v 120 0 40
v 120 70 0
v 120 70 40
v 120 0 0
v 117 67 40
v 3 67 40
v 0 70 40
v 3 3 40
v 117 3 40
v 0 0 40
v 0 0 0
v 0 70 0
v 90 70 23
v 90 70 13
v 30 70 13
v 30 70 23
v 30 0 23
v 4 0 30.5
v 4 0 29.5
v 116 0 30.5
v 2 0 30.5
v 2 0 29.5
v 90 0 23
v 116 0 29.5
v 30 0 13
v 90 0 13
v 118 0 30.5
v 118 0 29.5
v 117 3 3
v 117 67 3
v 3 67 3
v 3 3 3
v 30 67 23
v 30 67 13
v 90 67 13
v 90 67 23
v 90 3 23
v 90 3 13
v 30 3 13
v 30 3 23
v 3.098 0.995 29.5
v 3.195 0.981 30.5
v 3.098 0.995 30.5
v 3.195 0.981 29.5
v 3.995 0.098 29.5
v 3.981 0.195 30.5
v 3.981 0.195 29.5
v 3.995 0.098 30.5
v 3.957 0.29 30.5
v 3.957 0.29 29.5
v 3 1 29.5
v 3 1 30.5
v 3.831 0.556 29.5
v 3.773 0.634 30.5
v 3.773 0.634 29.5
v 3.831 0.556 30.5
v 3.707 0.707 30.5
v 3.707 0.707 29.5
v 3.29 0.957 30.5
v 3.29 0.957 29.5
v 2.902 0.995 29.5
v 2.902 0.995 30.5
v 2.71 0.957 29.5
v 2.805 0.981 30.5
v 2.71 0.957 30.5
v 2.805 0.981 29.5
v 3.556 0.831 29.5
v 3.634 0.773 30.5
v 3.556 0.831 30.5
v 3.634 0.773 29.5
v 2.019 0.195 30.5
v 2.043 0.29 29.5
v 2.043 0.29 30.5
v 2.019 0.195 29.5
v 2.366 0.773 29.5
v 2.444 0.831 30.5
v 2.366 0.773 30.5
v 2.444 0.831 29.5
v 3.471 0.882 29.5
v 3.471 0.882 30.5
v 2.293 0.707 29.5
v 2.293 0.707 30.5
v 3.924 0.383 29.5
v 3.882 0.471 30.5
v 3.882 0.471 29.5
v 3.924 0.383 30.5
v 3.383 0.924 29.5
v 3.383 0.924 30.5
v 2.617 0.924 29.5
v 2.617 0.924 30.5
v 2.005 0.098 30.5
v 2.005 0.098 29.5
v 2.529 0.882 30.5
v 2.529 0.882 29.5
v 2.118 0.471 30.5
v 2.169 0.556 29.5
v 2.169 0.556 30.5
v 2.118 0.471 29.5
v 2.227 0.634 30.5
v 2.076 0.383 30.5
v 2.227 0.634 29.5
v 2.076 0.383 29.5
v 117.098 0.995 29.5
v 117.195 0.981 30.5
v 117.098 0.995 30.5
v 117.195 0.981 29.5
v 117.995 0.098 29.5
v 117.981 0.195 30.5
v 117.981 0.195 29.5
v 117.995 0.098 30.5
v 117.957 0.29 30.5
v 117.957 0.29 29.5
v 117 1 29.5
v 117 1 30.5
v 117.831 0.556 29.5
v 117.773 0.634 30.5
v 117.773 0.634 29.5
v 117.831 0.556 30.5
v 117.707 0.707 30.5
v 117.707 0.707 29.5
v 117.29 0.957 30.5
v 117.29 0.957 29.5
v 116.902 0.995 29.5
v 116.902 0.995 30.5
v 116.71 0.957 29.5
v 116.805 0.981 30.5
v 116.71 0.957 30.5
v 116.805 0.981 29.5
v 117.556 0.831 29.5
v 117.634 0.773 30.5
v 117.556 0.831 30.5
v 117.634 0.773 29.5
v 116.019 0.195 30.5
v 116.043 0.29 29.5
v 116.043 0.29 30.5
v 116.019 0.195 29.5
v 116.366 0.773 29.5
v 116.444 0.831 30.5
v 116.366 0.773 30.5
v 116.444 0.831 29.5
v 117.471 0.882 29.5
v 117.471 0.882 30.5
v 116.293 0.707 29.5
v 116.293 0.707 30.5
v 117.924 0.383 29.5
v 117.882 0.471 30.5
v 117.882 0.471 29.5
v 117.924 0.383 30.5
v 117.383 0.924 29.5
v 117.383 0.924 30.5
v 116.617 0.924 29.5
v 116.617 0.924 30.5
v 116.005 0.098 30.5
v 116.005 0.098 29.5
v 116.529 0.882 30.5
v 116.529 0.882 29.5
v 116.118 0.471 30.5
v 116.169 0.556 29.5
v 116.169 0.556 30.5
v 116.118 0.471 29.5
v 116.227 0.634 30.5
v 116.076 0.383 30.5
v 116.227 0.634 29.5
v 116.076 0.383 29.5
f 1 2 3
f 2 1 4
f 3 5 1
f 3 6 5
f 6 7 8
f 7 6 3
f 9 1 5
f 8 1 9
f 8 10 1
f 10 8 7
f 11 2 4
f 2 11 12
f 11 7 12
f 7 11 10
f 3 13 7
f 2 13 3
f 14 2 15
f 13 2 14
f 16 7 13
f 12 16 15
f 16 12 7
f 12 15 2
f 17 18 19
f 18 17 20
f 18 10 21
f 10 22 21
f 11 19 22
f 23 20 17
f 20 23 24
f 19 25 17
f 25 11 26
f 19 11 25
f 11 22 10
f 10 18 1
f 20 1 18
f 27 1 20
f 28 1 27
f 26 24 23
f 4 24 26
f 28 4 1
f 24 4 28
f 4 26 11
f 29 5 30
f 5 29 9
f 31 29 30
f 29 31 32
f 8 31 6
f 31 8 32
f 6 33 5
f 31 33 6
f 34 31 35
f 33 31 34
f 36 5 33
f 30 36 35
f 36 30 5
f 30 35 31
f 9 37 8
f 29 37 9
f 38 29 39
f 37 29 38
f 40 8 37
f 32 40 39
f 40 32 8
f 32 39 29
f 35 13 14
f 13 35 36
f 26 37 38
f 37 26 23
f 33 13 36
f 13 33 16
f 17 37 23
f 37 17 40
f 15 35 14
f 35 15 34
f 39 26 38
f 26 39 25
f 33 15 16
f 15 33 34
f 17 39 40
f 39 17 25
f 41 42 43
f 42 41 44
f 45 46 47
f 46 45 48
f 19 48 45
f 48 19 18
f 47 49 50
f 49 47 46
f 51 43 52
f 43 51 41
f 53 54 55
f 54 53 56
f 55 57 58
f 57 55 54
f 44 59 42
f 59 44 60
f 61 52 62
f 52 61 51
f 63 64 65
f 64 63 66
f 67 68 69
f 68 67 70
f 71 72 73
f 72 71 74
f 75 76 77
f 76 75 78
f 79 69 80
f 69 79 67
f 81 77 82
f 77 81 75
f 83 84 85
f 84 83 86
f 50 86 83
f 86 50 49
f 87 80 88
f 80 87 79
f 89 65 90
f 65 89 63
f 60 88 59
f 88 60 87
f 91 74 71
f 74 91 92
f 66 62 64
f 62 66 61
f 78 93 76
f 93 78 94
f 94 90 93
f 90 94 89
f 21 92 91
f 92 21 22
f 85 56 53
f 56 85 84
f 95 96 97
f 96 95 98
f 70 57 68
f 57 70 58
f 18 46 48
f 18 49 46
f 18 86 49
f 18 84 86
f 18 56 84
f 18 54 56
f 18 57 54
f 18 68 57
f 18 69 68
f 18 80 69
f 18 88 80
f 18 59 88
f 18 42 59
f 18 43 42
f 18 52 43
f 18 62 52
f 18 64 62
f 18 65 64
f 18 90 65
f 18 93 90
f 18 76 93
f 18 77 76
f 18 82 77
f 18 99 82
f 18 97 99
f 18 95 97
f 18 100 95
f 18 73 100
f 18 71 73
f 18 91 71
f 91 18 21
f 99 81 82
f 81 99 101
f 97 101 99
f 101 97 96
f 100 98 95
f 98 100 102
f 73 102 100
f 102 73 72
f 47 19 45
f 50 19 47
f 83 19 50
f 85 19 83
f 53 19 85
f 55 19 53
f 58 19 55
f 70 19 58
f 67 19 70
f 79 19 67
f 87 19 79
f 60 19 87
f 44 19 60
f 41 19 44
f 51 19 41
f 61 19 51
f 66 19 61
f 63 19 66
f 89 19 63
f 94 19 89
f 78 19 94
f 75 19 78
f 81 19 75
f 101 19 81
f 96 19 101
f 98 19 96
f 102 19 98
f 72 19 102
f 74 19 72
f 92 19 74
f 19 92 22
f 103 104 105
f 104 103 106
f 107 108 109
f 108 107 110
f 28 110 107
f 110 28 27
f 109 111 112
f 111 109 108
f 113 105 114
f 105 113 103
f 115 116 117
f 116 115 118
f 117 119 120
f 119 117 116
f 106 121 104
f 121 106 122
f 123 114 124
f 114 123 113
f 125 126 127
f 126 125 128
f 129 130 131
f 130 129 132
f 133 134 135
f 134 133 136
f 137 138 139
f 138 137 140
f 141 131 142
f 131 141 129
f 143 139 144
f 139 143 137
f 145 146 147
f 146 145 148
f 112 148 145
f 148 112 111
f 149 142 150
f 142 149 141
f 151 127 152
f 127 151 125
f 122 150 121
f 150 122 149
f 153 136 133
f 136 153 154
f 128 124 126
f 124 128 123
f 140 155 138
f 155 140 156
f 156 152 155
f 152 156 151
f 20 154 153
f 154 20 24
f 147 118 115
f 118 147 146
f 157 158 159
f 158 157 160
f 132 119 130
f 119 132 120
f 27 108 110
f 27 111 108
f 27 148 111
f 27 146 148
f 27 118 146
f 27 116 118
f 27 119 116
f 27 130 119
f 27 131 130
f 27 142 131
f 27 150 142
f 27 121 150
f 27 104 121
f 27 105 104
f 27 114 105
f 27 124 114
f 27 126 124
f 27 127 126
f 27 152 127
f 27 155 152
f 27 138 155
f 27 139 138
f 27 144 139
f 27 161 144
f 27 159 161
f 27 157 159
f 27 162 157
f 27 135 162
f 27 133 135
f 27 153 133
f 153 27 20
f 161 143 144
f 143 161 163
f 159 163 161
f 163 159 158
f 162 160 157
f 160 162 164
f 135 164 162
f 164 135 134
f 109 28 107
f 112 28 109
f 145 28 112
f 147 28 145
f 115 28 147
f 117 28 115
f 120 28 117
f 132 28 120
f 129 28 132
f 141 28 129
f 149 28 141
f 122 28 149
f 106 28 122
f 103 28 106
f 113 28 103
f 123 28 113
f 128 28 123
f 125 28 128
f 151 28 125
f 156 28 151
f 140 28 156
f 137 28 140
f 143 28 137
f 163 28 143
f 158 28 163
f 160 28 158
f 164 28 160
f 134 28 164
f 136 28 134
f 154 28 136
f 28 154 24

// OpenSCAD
// Buffer tank for mini horizontal gel-electrophoresis box
// Outer dimensions: 120 mm (X) x 70 mm (Y) x 40 mm (Z)
// Wall thickness: 3 mm
// Floor thickness: 3 mm
// Platform: 60 mm (X) x 70 mm (Y) x 10 mm (Z), centered in X, z = 13

// Dimensions
tank_length = 120;   // X dimension
tank_width = 70;    // Y dimension
tank_height = 40;     // Z dimension
wall_thickness = 3; // Wall and floor thickness
platform_length = 60; // X dimension of platform
platform_width = 70;  // Y dimension of platform (full width)
platform_height = 10; // Z dimension of platform
platform_z = 13;    // Platform top height above floor
hole_diameter = 2;    // Electrode hole diameter
hole_z = 30;          // Electrode hole height

// Main tank body (outer dimensions)
outer = [tank_length, tank_width, tank_height];

// Inner dimensions (subtracting wall thickness)
inner_length = tank_length - 2 * wall_thickness;
inner_width = tank_width - 2 * wall_thickness;
inner_height = tank_height - wall_thickness;

// Platform dimensions (inner)
platform_inner_length = platform_length;
platform_inner_width = platform_width;

// Create the tank
difference() {
  // Outer shell
  cube(outer, center = false);
  
  // Inner hollow
  translate([wall_thickness, wall_thickness, wall_thickness]) {
    cube([inner_length, inner_width, inner_height], center = false);
  }
  
  // Platform (cut out from inner volume)
  translate([(tank_length - platform_length) / 2, 0, platform_z]) {
    cube([platform_length, platform_width, platform_height], center = false);
  }
  
  // Electrode holes (at each X end)
  // Left hole
  translate([wall_thickness, 0, hole_z]) {
    cylinder(h = 1, d = hole_diameter, center = true, $fn = 64);
  }
  
  // Right hole
  translate([tank_length - wall_thickness, 0, hole_z]) {
    cylinder(h = 1, d = hole_diameter, center = true, $fn = 64);
  }
}
